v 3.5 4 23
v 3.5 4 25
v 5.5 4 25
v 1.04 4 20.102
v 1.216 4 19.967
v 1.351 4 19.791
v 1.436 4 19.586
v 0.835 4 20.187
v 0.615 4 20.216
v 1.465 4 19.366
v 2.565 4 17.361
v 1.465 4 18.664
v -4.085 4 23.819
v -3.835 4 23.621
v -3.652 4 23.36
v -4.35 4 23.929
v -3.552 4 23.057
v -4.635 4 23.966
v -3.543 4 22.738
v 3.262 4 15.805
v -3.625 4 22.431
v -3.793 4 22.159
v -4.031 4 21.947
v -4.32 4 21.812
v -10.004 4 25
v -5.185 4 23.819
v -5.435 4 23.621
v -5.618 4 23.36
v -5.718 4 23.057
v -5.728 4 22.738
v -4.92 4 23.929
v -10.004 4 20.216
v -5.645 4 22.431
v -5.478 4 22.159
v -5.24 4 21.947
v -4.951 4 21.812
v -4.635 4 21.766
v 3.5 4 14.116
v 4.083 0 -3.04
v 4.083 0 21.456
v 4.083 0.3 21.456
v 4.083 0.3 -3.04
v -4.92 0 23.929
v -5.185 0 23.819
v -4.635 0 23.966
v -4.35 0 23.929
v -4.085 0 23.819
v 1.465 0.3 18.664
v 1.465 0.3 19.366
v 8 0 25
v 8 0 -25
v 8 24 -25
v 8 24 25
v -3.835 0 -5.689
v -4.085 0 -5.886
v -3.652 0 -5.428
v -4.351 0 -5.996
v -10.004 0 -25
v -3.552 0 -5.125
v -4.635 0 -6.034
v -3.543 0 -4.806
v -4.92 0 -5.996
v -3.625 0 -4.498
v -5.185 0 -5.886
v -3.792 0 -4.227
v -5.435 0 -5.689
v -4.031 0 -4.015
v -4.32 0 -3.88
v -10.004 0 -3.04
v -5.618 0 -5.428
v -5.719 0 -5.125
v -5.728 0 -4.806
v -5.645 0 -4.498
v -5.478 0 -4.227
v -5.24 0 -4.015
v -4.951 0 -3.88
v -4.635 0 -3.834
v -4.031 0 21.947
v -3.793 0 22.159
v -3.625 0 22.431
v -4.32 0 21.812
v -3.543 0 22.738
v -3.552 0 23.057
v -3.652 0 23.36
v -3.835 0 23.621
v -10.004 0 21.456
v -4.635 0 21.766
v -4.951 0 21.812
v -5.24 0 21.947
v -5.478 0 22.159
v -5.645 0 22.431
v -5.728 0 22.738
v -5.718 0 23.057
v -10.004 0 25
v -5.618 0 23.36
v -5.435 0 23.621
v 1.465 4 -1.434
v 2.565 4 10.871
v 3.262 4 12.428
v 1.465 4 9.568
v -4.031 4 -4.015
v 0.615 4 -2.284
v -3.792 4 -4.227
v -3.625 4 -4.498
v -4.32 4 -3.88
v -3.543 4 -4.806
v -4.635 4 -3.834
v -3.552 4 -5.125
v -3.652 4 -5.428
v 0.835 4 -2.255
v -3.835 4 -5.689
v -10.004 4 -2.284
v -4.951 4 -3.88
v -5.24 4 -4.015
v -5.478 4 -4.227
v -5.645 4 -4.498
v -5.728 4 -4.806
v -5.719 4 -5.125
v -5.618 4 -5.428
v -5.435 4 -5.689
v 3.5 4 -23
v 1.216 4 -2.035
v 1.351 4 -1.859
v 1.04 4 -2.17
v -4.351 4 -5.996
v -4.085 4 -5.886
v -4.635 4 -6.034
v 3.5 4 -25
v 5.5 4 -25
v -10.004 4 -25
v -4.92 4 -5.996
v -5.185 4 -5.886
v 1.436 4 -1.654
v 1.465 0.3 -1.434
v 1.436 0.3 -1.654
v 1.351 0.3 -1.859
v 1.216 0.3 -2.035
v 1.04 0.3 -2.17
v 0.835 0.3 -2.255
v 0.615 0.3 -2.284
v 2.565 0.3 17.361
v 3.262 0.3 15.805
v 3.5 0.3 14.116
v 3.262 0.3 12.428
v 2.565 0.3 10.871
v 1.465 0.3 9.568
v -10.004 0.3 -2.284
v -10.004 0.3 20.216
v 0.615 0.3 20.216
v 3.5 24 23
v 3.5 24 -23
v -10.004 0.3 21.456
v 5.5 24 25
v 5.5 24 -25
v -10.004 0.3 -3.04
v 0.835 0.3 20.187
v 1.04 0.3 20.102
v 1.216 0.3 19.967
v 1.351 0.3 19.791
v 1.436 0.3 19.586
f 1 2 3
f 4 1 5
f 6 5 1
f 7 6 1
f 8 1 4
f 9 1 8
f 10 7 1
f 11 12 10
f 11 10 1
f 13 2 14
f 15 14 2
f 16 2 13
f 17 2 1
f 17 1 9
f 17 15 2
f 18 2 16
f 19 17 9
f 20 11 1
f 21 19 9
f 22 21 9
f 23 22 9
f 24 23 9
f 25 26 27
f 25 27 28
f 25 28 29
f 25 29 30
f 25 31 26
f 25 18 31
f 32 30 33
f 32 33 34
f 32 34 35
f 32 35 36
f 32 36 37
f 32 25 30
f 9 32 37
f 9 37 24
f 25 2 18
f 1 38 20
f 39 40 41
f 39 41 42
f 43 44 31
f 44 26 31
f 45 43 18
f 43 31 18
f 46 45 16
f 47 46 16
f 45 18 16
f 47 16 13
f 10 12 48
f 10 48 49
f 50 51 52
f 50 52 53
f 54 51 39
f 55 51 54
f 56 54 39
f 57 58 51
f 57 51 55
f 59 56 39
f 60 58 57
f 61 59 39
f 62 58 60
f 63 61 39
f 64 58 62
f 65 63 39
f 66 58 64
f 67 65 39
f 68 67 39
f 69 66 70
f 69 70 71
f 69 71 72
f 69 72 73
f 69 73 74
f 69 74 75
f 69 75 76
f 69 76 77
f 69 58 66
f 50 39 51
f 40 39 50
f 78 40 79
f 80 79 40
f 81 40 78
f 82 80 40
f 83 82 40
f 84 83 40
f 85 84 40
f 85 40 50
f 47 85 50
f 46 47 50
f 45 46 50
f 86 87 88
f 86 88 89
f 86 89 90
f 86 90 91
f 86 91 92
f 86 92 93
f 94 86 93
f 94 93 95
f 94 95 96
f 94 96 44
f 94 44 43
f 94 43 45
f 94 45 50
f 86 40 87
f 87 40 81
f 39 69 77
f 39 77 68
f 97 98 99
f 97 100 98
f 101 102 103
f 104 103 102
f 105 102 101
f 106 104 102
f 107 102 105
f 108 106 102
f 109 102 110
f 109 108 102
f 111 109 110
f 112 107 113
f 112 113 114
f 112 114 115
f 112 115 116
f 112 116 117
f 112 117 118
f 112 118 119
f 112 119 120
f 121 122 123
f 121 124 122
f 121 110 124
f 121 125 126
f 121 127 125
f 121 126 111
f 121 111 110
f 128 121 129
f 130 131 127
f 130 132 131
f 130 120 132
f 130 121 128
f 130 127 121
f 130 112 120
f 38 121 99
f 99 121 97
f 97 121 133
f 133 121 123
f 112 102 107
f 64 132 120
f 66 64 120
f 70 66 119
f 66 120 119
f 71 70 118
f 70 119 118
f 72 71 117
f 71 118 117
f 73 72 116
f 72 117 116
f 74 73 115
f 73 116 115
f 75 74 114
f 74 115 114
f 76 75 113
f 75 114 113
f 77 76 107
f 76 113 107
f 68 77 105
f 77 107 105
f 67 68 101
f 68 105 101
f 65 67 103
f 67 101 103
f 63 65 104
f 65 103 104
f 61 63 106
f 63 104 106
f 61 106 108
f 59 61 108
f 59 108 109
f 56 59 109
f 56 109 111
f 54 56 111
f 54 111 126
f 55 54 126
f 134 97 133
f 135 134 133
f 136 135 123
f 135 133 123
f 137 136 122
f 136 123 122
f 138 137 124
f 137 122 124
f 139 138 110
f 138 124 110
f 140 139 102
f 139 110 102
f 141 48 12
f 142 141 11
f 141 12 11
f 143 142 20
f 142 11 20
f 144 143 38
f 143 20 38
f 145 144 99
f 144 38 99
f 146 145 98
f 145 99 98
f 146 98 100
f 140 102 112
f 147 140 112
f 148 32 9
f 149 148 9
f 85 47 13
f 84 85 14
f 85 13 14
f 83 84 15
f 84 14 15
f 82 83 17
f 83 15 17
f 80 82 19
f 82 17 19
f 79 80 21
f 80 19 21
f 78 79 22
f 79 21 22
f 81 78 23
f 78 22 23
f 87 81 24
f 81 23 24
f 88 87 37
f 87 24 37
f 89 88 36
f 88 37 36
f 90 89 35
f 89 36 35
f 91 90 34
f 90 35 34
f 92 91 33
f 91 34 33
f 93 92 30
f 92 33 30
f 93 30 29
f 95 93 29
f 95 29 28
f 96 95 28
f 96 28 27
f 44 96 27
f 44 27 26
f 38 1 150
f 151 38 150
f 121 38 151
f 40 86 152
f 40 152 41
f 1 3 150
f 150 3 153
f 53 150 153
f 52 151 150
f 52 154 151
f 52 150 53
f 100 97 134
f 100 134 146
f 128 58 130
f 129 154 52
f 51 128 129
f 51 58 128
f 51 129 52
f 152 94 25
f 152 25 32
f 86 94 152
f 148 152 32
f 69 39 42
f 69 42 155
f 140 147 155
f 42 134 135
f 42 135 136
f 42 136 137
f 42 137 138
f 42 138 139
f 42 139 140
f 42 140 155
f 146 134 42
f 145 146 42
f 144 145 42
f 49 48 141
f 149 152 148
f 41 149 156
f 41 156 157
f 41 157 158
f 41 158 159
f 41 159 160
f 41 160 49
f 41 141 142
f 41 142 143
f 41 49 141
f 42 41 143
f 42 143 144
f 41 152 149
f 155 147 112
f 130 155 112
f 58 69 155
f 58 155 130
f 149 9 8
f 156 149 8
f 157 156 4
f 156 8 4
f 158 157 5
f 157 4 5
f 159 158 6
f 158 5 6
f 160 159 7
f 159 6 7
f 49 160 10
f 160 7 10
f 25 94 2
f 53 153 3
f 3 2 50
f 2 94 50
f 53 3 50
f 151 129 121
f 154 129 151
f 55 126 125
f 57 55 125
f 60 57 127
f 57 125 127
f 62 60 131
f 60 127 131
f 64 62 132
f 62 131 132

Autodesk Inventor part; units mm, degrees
ref_plane "YZ Plane" through (0, 0, 0) normal (1, 0, 0) x (0, 1, 0)
ref_plane "XZ Plane" through (0, 0, 0) normal (0, 1, 0) x (-1, 0, 0)
ref_plane "XY Plane" through (0, 0, 0) normal (0, 0, 1) x (1, 0, 0)
sketch "Эскиз1" plane through (0, 0, 0) normal (0, 1, 0) x (-1, 0, 0)
  line L0 (0, 0) -> (0, -20)
  circle A0 centre (0, -20) radius 2
  line L1 (-3.5, 25) -> (3.5, 25)
  line L2 (3.5, 25) -> (3.5, -25)
  line L3 (3.5, -25) -> (-3.5, -25)
  line L4 (-3.5, -25) -> (-3.5, 25)
  line L5 (-3.5, 25) -> (3.5, -25) construction
  line L6 (3.5, 25) -> (-3.5, -25) construction
  line L7 (0, 0) -> (0, 20)
  circle A1 centre (0, 20) radius 2
  dimension "d0" = 20
  dimension "d1" = 4
  dimension "d2" = 7
  dimension "d3" = 50
  dimension "d4" = 20
  dimension "d5" = 4
extrude "Выдавливание1" add sketch "Эскиз1" along normal blind 4 contours A0 | L1 L2 L3 L4 | A1
sketch "Эскиз2" plane through (3.5, 0, 25) normal (1, 0, 0) x (0, 0, -1)
  line L0 (50, 0) -> (0, 0) projected
  line L1 (0, 4) -> (50, 4)
  line L2 (50, 4) -> (50, 0)
  line L3 (50, 0) -> (0, 0)
  line L4 (0, 0) -> (0, 4)
  point P0 (25, 0)
extrude "Выдавливание2" add sketch "Эскиз2" along normal blind 7
sketch "Эскиз3" plane through (0, 4, 0) normal (0, 1, 0) x (1, 0, 0)
  line L0 (-3.5, -25) -> (10.5, -25) projected
  line L1 (-3.5, 25) -> (10.5, 25) projected
  line L2 (10.5, -25) -> (3.5, -25)
  line L3 (3.5, -25) -> (3.5, 25)
  line L4 (3.5, 25) -> (10.5, 25)
  line L5 (10.5, 25) -> (10.5, -25)
  point P0 (0, 0)
  dimension "d10" = 7
extrude "Выдавливание3" add sketch "Эскиз3" along normal blind 20
sketch "Эскиз5" plane through (0, 4, 0) normal (0, 1, 0) x (1, 0, 0)
  line L0 (-7.5352, -8.6362) -> (-7.5352, -8.5162)
  arc A0 (-1.7352, -8.5162) -> (-7.5352, -8.5162) centre (-4.6352, -8.5162) ccw
  line L1 (-1.7352, -8.5162) -> (-1.7352, -8.6362)
  arc A1 (1.3648, -12.5541) -> (-1.7352, -8.6362) centre (-4.6352, -14.1162) ccw
  line L2 (1.3648, -12.5541) -> (1.3648, 1.4338)
  arc A2 (1.3648, 1.4338) -> (0.6148, 2.1838) centre (0.6148, 1.4338) ccw
  line L3 (0.6148, 2.1838) -> (-9.8852, 2.1838)
  arc A3 (-9.8852, 2.1838) -> (-10.6352, 1.4338) centre (-9.8852, 1.4338) ccw
  line L4 (-10.6352, 1.4338) -> (-10.6352, -12.5541)
  arc A4 (-7.5352, -8.6362) -> (-10.6352, -12.5541) centre (-4.6352, -14.1162) ccw
  line L5 (0.4648, -4.2162) -> (0.4648, 0.7838)
  arc A5 (-0.0352, -4.7162) -> (0.4648, -4.2162) centre (-0.0352, -4.2162) ccw
  line L6 (-9.2352, -4.7162) -> (-0.0352, -4.7162)
  arc A6 (-9.7352, -4.2162) -> (-9.2352, -4.7162) centre (-9.2352, -4.2162) ccw
  line L7 (-9.7352, 0.7838) -> (-9.7352, -4.2162)
  arc A7 (-9.2352, 1.2838) -> (-9.7352, 0.7838) centre (-9.2352, 0.7838) ccw
  line L8 (-0.0352, 1.2838) -> (-9.2352, 1.2838)
  arc A8 (0.4648, 0.7838) -> (-0.0352, 1.2838) centre (-0.0352, 0.7838) ccw
  arc A9 (-5.1852, 5.8865) -> (-4.0852, 5.8865) centre (-4.6352, 4.9338) ccw
  line L9 (-5.1852, 7.0838) -> (-5.1852, 5.8865)
  line L10 (-5.1852, 7.0838) -> (-9.8852, 7.0838)
  arc A10 (-9.8852, 7.0838) -> (-10.7352, 6.2338) centre (-9.8852, 6.2338) ccw
  line L11 (-10.7352, 6.2338) -> (-10.7352, 1.4338)
  arc A11 (-9.8852, 2.2838) -> (-10.7352, 1.4338) centre (-9.8852, 1.4338) ccw
  line L12 (0.6148, 2.2838) -> (-9.8852, 2.2838)
  arc A12 (1.4648, 1.4338) -> (0.6148, 2.2838) centre (0.6148, 1.4338) ccw
  line L13 (1.4648, 1.4338) -> (1.4648, 6.2338)
  arc A13 (1.4648, 6.2338) -> (0.6148, 7.0838) centre (0.6148, 6.2338) ccw
  line L14 (0.6148, 7.0838) -> (-4.0852, 7.0838)
  line L15 (-4.0852, 5.8865) -> (-4.0852, 7.0838)
  line L16 (-9.8852, -25.0162) -> (-5.1852, -25.0162)
  line L17 (-5.1852, -23.8188) -> (-5.1852, -25.0162)
  arc A14 (-4.0852, -23.8188) -> (-5.1852, -23.8188) centre (-4.6352, -22.8662) ccw
  line L18 (-4.0852, -25.0162) -> (-4.0852, -23.8188)
  line L19 (-4.0852, -25.0162) -> (0.6148, -25.0162)
  arc A15 (0.6148, -25.0162) -> (1.4648, -24.1662) centre (0.6148, -24.1662) ccw
  line L20 (1.4648, -24.1662) -> (1.4648, -19.3662)
  arc A16 (0.6148, -20.2162) -> (1.4648, -19.3662) centre (0.6148, -19.3662) ccw
  line L21 (-9.8852, -20.2162) -> (0.6148, -20.2162)
  arc A17 (-10.7352, -19.3662) -> (-9.8852, -20.2162) centre (-9.8852, -19.3662) ccw
  line L22 (-10.7352, -19.3662) -> (-10.7352, -24.1662)
  arc A18 (-10.7352, -24.1662) -> (-9.8852, -25.0162) centre (-9.8852, -24.1662) ccw
  line L23 (-10.7352, -19.3662) -> (-10.7352, -15.6782)
  line L24 (-10.7352, -12.5541) -> (-10.7352, -14.1162)
  line L25 (-10.7352, -14.1162) -> (-10.7352, -15.6782)
  line L26 (-10.7352, -12.5541) -> (-10.7352, 1.4338)
  line L27 (1.4648, 1.4338) -> (1.4648, -12.5541)
  line L28 (1.4648, -15.6782) -> (1.4648, -19.3662)
  line L29 (1.4648, -15.6782) -> (1.4648, -14.1162)
  line L30 (1.4648, -14.1162) -> (1.4648, -12.5541)
  arc A19 (-10.6352, -15.6782) -> (-6.1972, -20.1162) centre (-4.6352, -14.1162) ccw
  line L31 (-10.6352, -15.6782) -> (-10.6352, -19.3662)
  arc A20 (-10.6352, -19.3662) -> (-9.8852, -20.1162) centre (-9.8852, -19.3662) ccw
  line L32 (-9.8852, -20.1162) -> (-6.1972, -20.1162)
  line L33 (1.3648, -19.3662) -> (1.3648, -15.6782)
  arc A21 (-3.0731, -20.1162) -> (1.3648, -15.6782) centre (-4.6352, -14.1162) ccw
  line L34 (-3.0731, -20.1162) -> (0.6148, -20.1162)
  arc A22 (0.6148, -20.1162) -> (1.3648, -19.3662) centre (0.6148, -19.3662) ccw
  circle A23 centre (-4.6352, 4.9338) radius 1.1
  line L35 (-5.1852, 5.8865) -> (-5.1852, 7.0838)
  line L36 (-4.0852, 7.0838) -> (-5.1852, 7.0838)
  circle A24 centre (-4.6352, -22.8662) radius 1.1
  line L37 (-5.1852, -25.0162) -> (-5.1852, -23.8188)
  line L38 (-4.0852, -25.0162) -> (-5.1852, -25.0162)
  circle A25 centre (-4.6352, -14.1162) radius 0.8
  line L39 (-3.5, 25) -> (3.5, 25) projected
  line L40 (-13.5, 25) -> (-13.5, -25)
  line L41 (-13.5, -25) -> (-3.5, -25)
  line L42 (-3.5, -25) -> (-3.5, 25)
  point P0 (0, 0)
  point P1 (-4.6352, -8.9662)
  dimension "d16" = 10
extrude "Выдавливание5" cut sketch "Эскиз5" against normal blind 10 contours A4 L4 A3 L3 L42 L8 A7 L7 A6 L6 A0 L0 | L0 A0 L42 L21 A17 L23 L25 L24 L26 A11 L12 L3 A3 L4 A4 | L42 L6 A5 L5 A8 L8 L3 A2 L2 A1 L1 A0 | A0 L1 A1 L2 A2 L3 L42 L12 A12 L27 L30 L29 L28 A16 L21 | L42 L8 A8 L5 A5 L6 | L6 A6 L7 A7 L8 L42 | A19 L32 A20 L31 | A22 L34 A21 L33 | A25
move faces "Перенос1" translate (-6.504, 0, 0) faces at (-3.5, 2.6667, -9.8559) (-3.5, 1.3333, 23.4054)
sketch "Эскиз6" plane through (0, 4, 0) normal (0, 1, 0) x (1, 0, 0)
  arc A0 (1.4648, -18.6645) -> (1.4648, -9.5679) centre (-2.6, -14.1162) ccw
  line L0 (1.4648, -9.5679) -> (1.4648, -19.3662)
  point P0 (0, 0)
  point P1 (0.2532, -8.7246)
  point P2 (-5.4532, -8.7246)
extrude "Выдавливание6" cut sketch "Эскиз6" against normal blind 7
sketch "Эскиз7" plane through (0, 0, 0) normal (0, -1, 0) x (1, 0, 0)
  line L0 (-10.004, 25) -> (-10.004, 20.2162) projected
  line L1 (-10.004, 21.4561) -> (4.0826, 21.4561)
  line L2 (4.0826, 21.4561) -> (4.0826, -3.0396)
  line L3 (4.0826, -3.0396) -> (-10.004, -3.0396)
  line L4 (-10.004, -3.0396) -> (-10.004, 21.4561)
  point P0 (0, 0)
extrude "Выдавливание7" cut sketch "Эскиз7" against normal blind 0.3
sketch "Эскиз8" plane through (0, 4, 0) normal (0, 1, 0) x (1, 0, 0)
  line L0 (-7.5352, -8.6362) -> (-7.5352, -8.5162)
  arc A0 (-1.7352, -8.5162) -> (-7.5352, -8.5162) centre (-4.6352, -8.5162) ccw
  line L1 (-1.7352, -8.5162) -> (-1.7352, -8.6362)
  arc A1 (1.3648, -12.5541) -> (-1.7352, -8.6362) centre (-4.6352, -14.1162) ccw
  line L2 (1.3648, -12.5541) -> (1.3648, 1.4338)
  arc A2 (1.3648, 1.4338) -> (0.6148, 2.1838) centre (0.6148, 1.4338) ccw
  line L3 (0.6148, 2.1838) -> (-9.8852, 2.1838)
  arc A3 (-9.8852, 2.1838) -> (-10.6352, 1.4338) centre (-9.8852, 1.4338) ccw
  line L4 (-10.6352, 1.4338) -> (-10.6352, -12.5541)
  arc A4 (-7.5352, -8.6362) -> (-10.6352, -12.5541) centre (-4.6352, -14.1162) ccw
  line L5 (0.4648, -4.2162) -> (0.4648, 0.7838)
  arc A5 (-0.0352, -4.7162) -> (0.4648, -4.2162) centre (-0.0352, -4.2162) ccw
  line L6 (-9.2352, -4.7162) -> (-0.0352, -4.7162)
  arc A6 (-9.7352, -4.2162) -> (-9.2352, -4.7162) centre (-9.2352, -4.2162) ccw
  line L7 (-9.7352, 0.7838) -> (-9.7352, -4.2162)
  arc A7 (-9.2352, 1.2838) -> (-9.7352, 0.7838) centre (-9.2352, 0.7838) ccw
  line L8 (-0.0352, 1.2838) -> (-9.2352, 1.2838)
  arc A8 (0.4648, 0.7838) -> (-0.0352, 1.2838) centre (-0.0352, 0.7838) ccw
  arc A9 (-5.1852, 5.8865) -> (-4.0852, 5.8865) centre (-4.6352, 4.9338) ccw
  line L9 (-5.1852, 7.0838) -> (-5.1852, 5.8865)
  line L10 (-5.1852, 7.0838) -> (-9.8852, 7.0838)
  arc A10 (-9.8852, 7.0838) -> (-10.7352, 6.2338) centre (-9.8852, 6.2338) ccw
  line L11 (-10.7352, 6.2338) -> (-10.7352, 1.4338)
  arc A11 (-9.8852, 2.2838) -> (-10.7352, 1.4338) centre (-9.8852, 1.4338) ccw
  line L12 (0.6148, 2.2838) -> (-9.8852, 2.2838)
  arc A12 (1.4648, 1.4338) -> (0.6148, 2.2838) centre (0.6148, 1.4338) ccw
  line L13 (1.4648, 1.4338) -> (1.4648, 6.2338)
  arc A13 (1.4648, 6.2338) -> (0.6148, 7.0838) centre (0.6148, 6.2338) ccw
  line L14 (0.6148, 7.0838) -> (-4.0852, 7.0838)
  line L15 (-4.0852, 5.8865) -> (-4.0852, 7.0838)
  line L16 (-9.8852, -25.0162) -> (-5.1852, -25.0162)
  line L17 (-5.1852, -23.8188) -> (-5.1852, -25.0162)
  arc A14 (-4.0852, -23.8188) -> (-5.1852, -23.8188) centre (-4.6352, -22.8662) ccw
  line L18 (-4.0852, -25.0162) -> (-4.0852, -23.8188)
  line L19 (-4.0852, -25.0162) -> (0.6148, -25.0162)
  arc A15 (0.6148, -25.0162) -> (1.4648, -24.1662) centre (0.6148, -24.1662) ccw
  line L20 (1.4648, -24.1662) -> (1.4648, -19.3662)
  arc A16 (0.6148, -20.2162) -> (1.4648, -19.3662) centre (0.6148, -19.3662) ccw
  line L21 (-9.8852, -20.2162) -> (0.6148, -20.2162)
  arc A17 (-10.7352, -19.3662) -> (-9.8852, -20.2162) centre (-9.8852, -19.3662) ccw
  line L22 (-10.7352, -19.3662) -> (-10.7352, -24.1662)
  arc A18 (-10.7352, -24.1662) -> (-9.8852, -25.0162) centre (-9.8852, -24.1662) ccw
  line L23 (-10.7352, -19.3662) -> (-10.7352, -15.6782)
  line L24 (-10.7352, -12.5541) -> (-10.7352, -14.1162)
  line L25 (-10.7352, -14.1162) -> (-10.7352, -15.6782)
  line L26 (-10.7352, -12.5541) -> (-10.7352, 1.4338)
  line L27 (1.4648, 1.4338) -> (1.4648, -12.5541)
  line L28 (1.4648, -15.6782) -> (1.4648, -19.3662)
  line L29 (1.4648, -15.6782) -> (1.4648, -14.1162)
  line L30 (1.4648, -14.1162) -> (1.4648, -12.5541)
  arc A19 (-10.6352, -15.6782) -> (-6.1972, -20.1162) centre (-4.6352, -14.1162) ccw
  line L31 (-10.6352, -15.6782) -> (-10.6352, -19.3662)
  arc A20 (-10.6352, -19.3662) -> (-9.8852, -20.1162) centre (-9.8852, -19.3662) ccw
  line L32 (-9.8852, -20.1162) -> (-6.1972, -20.1162)
  line L33 (1.3648, -19.3662) -> (1.3648, -15.6782)
  arc A21 (-3.0731, -20.1162) -> (1.3648, -15.6782) centre (-4.6352, -14.1162) ccw
  line L34 (-3.0731, -20.1162) -> (0.6148, -20.1162)
  arc A22 (0.6148, -20.1162) -> (1.3648, -19.3662) centre (0.6148, -19.3662) ccw
  circle A23 centre (-4.6352, 4.9338) radius 1.1
  line L35 (-5.1852, 5.8865) -> (-5.1852, 7.0838)
  line L36 (-4.0852, 7.0838) -> (-5.1852, 7.0838)
  circle A24 centre (-4.6352, -22.8662) radius 1.1
  line L37 (-5.1852, -25.0162) -> (-5.1852, -23.8188)
  line L38 (-4.0852, -25.0162) -> (-5.1852, -25.0162)
  circle A25 centre (-4.6352, -14.1162) radius 0.8
  line L39 (-3.5, 25) -> (3.5, 25)
  line L40 (-13.5, 25) -> (-13.5, -25)
  line L41 (-13.5, -25) -> (-3.5, -25)
  line L42 (-3.5, -25) -> (-3.5, 25)
  point P0 (0, 0)
  point P1 (0, 0)
  point P2 (-4.6352, -8.9662)
  dimension "d26" = 10
extrude "Выдавливание8" cut sketch "Эскиз8" against normal through all contours A24 A14 | A9 A23
move faces "Перенос2" translate (-2.5, 0, 0) faces at (10.5, 8, -8.3333)
chamfer "Фаска1" distance 2 angle 45 2 edges at (3.5, 14, 25) (3.5, 14, -25)
properties part number "000.705 - Пассивный прижим"
